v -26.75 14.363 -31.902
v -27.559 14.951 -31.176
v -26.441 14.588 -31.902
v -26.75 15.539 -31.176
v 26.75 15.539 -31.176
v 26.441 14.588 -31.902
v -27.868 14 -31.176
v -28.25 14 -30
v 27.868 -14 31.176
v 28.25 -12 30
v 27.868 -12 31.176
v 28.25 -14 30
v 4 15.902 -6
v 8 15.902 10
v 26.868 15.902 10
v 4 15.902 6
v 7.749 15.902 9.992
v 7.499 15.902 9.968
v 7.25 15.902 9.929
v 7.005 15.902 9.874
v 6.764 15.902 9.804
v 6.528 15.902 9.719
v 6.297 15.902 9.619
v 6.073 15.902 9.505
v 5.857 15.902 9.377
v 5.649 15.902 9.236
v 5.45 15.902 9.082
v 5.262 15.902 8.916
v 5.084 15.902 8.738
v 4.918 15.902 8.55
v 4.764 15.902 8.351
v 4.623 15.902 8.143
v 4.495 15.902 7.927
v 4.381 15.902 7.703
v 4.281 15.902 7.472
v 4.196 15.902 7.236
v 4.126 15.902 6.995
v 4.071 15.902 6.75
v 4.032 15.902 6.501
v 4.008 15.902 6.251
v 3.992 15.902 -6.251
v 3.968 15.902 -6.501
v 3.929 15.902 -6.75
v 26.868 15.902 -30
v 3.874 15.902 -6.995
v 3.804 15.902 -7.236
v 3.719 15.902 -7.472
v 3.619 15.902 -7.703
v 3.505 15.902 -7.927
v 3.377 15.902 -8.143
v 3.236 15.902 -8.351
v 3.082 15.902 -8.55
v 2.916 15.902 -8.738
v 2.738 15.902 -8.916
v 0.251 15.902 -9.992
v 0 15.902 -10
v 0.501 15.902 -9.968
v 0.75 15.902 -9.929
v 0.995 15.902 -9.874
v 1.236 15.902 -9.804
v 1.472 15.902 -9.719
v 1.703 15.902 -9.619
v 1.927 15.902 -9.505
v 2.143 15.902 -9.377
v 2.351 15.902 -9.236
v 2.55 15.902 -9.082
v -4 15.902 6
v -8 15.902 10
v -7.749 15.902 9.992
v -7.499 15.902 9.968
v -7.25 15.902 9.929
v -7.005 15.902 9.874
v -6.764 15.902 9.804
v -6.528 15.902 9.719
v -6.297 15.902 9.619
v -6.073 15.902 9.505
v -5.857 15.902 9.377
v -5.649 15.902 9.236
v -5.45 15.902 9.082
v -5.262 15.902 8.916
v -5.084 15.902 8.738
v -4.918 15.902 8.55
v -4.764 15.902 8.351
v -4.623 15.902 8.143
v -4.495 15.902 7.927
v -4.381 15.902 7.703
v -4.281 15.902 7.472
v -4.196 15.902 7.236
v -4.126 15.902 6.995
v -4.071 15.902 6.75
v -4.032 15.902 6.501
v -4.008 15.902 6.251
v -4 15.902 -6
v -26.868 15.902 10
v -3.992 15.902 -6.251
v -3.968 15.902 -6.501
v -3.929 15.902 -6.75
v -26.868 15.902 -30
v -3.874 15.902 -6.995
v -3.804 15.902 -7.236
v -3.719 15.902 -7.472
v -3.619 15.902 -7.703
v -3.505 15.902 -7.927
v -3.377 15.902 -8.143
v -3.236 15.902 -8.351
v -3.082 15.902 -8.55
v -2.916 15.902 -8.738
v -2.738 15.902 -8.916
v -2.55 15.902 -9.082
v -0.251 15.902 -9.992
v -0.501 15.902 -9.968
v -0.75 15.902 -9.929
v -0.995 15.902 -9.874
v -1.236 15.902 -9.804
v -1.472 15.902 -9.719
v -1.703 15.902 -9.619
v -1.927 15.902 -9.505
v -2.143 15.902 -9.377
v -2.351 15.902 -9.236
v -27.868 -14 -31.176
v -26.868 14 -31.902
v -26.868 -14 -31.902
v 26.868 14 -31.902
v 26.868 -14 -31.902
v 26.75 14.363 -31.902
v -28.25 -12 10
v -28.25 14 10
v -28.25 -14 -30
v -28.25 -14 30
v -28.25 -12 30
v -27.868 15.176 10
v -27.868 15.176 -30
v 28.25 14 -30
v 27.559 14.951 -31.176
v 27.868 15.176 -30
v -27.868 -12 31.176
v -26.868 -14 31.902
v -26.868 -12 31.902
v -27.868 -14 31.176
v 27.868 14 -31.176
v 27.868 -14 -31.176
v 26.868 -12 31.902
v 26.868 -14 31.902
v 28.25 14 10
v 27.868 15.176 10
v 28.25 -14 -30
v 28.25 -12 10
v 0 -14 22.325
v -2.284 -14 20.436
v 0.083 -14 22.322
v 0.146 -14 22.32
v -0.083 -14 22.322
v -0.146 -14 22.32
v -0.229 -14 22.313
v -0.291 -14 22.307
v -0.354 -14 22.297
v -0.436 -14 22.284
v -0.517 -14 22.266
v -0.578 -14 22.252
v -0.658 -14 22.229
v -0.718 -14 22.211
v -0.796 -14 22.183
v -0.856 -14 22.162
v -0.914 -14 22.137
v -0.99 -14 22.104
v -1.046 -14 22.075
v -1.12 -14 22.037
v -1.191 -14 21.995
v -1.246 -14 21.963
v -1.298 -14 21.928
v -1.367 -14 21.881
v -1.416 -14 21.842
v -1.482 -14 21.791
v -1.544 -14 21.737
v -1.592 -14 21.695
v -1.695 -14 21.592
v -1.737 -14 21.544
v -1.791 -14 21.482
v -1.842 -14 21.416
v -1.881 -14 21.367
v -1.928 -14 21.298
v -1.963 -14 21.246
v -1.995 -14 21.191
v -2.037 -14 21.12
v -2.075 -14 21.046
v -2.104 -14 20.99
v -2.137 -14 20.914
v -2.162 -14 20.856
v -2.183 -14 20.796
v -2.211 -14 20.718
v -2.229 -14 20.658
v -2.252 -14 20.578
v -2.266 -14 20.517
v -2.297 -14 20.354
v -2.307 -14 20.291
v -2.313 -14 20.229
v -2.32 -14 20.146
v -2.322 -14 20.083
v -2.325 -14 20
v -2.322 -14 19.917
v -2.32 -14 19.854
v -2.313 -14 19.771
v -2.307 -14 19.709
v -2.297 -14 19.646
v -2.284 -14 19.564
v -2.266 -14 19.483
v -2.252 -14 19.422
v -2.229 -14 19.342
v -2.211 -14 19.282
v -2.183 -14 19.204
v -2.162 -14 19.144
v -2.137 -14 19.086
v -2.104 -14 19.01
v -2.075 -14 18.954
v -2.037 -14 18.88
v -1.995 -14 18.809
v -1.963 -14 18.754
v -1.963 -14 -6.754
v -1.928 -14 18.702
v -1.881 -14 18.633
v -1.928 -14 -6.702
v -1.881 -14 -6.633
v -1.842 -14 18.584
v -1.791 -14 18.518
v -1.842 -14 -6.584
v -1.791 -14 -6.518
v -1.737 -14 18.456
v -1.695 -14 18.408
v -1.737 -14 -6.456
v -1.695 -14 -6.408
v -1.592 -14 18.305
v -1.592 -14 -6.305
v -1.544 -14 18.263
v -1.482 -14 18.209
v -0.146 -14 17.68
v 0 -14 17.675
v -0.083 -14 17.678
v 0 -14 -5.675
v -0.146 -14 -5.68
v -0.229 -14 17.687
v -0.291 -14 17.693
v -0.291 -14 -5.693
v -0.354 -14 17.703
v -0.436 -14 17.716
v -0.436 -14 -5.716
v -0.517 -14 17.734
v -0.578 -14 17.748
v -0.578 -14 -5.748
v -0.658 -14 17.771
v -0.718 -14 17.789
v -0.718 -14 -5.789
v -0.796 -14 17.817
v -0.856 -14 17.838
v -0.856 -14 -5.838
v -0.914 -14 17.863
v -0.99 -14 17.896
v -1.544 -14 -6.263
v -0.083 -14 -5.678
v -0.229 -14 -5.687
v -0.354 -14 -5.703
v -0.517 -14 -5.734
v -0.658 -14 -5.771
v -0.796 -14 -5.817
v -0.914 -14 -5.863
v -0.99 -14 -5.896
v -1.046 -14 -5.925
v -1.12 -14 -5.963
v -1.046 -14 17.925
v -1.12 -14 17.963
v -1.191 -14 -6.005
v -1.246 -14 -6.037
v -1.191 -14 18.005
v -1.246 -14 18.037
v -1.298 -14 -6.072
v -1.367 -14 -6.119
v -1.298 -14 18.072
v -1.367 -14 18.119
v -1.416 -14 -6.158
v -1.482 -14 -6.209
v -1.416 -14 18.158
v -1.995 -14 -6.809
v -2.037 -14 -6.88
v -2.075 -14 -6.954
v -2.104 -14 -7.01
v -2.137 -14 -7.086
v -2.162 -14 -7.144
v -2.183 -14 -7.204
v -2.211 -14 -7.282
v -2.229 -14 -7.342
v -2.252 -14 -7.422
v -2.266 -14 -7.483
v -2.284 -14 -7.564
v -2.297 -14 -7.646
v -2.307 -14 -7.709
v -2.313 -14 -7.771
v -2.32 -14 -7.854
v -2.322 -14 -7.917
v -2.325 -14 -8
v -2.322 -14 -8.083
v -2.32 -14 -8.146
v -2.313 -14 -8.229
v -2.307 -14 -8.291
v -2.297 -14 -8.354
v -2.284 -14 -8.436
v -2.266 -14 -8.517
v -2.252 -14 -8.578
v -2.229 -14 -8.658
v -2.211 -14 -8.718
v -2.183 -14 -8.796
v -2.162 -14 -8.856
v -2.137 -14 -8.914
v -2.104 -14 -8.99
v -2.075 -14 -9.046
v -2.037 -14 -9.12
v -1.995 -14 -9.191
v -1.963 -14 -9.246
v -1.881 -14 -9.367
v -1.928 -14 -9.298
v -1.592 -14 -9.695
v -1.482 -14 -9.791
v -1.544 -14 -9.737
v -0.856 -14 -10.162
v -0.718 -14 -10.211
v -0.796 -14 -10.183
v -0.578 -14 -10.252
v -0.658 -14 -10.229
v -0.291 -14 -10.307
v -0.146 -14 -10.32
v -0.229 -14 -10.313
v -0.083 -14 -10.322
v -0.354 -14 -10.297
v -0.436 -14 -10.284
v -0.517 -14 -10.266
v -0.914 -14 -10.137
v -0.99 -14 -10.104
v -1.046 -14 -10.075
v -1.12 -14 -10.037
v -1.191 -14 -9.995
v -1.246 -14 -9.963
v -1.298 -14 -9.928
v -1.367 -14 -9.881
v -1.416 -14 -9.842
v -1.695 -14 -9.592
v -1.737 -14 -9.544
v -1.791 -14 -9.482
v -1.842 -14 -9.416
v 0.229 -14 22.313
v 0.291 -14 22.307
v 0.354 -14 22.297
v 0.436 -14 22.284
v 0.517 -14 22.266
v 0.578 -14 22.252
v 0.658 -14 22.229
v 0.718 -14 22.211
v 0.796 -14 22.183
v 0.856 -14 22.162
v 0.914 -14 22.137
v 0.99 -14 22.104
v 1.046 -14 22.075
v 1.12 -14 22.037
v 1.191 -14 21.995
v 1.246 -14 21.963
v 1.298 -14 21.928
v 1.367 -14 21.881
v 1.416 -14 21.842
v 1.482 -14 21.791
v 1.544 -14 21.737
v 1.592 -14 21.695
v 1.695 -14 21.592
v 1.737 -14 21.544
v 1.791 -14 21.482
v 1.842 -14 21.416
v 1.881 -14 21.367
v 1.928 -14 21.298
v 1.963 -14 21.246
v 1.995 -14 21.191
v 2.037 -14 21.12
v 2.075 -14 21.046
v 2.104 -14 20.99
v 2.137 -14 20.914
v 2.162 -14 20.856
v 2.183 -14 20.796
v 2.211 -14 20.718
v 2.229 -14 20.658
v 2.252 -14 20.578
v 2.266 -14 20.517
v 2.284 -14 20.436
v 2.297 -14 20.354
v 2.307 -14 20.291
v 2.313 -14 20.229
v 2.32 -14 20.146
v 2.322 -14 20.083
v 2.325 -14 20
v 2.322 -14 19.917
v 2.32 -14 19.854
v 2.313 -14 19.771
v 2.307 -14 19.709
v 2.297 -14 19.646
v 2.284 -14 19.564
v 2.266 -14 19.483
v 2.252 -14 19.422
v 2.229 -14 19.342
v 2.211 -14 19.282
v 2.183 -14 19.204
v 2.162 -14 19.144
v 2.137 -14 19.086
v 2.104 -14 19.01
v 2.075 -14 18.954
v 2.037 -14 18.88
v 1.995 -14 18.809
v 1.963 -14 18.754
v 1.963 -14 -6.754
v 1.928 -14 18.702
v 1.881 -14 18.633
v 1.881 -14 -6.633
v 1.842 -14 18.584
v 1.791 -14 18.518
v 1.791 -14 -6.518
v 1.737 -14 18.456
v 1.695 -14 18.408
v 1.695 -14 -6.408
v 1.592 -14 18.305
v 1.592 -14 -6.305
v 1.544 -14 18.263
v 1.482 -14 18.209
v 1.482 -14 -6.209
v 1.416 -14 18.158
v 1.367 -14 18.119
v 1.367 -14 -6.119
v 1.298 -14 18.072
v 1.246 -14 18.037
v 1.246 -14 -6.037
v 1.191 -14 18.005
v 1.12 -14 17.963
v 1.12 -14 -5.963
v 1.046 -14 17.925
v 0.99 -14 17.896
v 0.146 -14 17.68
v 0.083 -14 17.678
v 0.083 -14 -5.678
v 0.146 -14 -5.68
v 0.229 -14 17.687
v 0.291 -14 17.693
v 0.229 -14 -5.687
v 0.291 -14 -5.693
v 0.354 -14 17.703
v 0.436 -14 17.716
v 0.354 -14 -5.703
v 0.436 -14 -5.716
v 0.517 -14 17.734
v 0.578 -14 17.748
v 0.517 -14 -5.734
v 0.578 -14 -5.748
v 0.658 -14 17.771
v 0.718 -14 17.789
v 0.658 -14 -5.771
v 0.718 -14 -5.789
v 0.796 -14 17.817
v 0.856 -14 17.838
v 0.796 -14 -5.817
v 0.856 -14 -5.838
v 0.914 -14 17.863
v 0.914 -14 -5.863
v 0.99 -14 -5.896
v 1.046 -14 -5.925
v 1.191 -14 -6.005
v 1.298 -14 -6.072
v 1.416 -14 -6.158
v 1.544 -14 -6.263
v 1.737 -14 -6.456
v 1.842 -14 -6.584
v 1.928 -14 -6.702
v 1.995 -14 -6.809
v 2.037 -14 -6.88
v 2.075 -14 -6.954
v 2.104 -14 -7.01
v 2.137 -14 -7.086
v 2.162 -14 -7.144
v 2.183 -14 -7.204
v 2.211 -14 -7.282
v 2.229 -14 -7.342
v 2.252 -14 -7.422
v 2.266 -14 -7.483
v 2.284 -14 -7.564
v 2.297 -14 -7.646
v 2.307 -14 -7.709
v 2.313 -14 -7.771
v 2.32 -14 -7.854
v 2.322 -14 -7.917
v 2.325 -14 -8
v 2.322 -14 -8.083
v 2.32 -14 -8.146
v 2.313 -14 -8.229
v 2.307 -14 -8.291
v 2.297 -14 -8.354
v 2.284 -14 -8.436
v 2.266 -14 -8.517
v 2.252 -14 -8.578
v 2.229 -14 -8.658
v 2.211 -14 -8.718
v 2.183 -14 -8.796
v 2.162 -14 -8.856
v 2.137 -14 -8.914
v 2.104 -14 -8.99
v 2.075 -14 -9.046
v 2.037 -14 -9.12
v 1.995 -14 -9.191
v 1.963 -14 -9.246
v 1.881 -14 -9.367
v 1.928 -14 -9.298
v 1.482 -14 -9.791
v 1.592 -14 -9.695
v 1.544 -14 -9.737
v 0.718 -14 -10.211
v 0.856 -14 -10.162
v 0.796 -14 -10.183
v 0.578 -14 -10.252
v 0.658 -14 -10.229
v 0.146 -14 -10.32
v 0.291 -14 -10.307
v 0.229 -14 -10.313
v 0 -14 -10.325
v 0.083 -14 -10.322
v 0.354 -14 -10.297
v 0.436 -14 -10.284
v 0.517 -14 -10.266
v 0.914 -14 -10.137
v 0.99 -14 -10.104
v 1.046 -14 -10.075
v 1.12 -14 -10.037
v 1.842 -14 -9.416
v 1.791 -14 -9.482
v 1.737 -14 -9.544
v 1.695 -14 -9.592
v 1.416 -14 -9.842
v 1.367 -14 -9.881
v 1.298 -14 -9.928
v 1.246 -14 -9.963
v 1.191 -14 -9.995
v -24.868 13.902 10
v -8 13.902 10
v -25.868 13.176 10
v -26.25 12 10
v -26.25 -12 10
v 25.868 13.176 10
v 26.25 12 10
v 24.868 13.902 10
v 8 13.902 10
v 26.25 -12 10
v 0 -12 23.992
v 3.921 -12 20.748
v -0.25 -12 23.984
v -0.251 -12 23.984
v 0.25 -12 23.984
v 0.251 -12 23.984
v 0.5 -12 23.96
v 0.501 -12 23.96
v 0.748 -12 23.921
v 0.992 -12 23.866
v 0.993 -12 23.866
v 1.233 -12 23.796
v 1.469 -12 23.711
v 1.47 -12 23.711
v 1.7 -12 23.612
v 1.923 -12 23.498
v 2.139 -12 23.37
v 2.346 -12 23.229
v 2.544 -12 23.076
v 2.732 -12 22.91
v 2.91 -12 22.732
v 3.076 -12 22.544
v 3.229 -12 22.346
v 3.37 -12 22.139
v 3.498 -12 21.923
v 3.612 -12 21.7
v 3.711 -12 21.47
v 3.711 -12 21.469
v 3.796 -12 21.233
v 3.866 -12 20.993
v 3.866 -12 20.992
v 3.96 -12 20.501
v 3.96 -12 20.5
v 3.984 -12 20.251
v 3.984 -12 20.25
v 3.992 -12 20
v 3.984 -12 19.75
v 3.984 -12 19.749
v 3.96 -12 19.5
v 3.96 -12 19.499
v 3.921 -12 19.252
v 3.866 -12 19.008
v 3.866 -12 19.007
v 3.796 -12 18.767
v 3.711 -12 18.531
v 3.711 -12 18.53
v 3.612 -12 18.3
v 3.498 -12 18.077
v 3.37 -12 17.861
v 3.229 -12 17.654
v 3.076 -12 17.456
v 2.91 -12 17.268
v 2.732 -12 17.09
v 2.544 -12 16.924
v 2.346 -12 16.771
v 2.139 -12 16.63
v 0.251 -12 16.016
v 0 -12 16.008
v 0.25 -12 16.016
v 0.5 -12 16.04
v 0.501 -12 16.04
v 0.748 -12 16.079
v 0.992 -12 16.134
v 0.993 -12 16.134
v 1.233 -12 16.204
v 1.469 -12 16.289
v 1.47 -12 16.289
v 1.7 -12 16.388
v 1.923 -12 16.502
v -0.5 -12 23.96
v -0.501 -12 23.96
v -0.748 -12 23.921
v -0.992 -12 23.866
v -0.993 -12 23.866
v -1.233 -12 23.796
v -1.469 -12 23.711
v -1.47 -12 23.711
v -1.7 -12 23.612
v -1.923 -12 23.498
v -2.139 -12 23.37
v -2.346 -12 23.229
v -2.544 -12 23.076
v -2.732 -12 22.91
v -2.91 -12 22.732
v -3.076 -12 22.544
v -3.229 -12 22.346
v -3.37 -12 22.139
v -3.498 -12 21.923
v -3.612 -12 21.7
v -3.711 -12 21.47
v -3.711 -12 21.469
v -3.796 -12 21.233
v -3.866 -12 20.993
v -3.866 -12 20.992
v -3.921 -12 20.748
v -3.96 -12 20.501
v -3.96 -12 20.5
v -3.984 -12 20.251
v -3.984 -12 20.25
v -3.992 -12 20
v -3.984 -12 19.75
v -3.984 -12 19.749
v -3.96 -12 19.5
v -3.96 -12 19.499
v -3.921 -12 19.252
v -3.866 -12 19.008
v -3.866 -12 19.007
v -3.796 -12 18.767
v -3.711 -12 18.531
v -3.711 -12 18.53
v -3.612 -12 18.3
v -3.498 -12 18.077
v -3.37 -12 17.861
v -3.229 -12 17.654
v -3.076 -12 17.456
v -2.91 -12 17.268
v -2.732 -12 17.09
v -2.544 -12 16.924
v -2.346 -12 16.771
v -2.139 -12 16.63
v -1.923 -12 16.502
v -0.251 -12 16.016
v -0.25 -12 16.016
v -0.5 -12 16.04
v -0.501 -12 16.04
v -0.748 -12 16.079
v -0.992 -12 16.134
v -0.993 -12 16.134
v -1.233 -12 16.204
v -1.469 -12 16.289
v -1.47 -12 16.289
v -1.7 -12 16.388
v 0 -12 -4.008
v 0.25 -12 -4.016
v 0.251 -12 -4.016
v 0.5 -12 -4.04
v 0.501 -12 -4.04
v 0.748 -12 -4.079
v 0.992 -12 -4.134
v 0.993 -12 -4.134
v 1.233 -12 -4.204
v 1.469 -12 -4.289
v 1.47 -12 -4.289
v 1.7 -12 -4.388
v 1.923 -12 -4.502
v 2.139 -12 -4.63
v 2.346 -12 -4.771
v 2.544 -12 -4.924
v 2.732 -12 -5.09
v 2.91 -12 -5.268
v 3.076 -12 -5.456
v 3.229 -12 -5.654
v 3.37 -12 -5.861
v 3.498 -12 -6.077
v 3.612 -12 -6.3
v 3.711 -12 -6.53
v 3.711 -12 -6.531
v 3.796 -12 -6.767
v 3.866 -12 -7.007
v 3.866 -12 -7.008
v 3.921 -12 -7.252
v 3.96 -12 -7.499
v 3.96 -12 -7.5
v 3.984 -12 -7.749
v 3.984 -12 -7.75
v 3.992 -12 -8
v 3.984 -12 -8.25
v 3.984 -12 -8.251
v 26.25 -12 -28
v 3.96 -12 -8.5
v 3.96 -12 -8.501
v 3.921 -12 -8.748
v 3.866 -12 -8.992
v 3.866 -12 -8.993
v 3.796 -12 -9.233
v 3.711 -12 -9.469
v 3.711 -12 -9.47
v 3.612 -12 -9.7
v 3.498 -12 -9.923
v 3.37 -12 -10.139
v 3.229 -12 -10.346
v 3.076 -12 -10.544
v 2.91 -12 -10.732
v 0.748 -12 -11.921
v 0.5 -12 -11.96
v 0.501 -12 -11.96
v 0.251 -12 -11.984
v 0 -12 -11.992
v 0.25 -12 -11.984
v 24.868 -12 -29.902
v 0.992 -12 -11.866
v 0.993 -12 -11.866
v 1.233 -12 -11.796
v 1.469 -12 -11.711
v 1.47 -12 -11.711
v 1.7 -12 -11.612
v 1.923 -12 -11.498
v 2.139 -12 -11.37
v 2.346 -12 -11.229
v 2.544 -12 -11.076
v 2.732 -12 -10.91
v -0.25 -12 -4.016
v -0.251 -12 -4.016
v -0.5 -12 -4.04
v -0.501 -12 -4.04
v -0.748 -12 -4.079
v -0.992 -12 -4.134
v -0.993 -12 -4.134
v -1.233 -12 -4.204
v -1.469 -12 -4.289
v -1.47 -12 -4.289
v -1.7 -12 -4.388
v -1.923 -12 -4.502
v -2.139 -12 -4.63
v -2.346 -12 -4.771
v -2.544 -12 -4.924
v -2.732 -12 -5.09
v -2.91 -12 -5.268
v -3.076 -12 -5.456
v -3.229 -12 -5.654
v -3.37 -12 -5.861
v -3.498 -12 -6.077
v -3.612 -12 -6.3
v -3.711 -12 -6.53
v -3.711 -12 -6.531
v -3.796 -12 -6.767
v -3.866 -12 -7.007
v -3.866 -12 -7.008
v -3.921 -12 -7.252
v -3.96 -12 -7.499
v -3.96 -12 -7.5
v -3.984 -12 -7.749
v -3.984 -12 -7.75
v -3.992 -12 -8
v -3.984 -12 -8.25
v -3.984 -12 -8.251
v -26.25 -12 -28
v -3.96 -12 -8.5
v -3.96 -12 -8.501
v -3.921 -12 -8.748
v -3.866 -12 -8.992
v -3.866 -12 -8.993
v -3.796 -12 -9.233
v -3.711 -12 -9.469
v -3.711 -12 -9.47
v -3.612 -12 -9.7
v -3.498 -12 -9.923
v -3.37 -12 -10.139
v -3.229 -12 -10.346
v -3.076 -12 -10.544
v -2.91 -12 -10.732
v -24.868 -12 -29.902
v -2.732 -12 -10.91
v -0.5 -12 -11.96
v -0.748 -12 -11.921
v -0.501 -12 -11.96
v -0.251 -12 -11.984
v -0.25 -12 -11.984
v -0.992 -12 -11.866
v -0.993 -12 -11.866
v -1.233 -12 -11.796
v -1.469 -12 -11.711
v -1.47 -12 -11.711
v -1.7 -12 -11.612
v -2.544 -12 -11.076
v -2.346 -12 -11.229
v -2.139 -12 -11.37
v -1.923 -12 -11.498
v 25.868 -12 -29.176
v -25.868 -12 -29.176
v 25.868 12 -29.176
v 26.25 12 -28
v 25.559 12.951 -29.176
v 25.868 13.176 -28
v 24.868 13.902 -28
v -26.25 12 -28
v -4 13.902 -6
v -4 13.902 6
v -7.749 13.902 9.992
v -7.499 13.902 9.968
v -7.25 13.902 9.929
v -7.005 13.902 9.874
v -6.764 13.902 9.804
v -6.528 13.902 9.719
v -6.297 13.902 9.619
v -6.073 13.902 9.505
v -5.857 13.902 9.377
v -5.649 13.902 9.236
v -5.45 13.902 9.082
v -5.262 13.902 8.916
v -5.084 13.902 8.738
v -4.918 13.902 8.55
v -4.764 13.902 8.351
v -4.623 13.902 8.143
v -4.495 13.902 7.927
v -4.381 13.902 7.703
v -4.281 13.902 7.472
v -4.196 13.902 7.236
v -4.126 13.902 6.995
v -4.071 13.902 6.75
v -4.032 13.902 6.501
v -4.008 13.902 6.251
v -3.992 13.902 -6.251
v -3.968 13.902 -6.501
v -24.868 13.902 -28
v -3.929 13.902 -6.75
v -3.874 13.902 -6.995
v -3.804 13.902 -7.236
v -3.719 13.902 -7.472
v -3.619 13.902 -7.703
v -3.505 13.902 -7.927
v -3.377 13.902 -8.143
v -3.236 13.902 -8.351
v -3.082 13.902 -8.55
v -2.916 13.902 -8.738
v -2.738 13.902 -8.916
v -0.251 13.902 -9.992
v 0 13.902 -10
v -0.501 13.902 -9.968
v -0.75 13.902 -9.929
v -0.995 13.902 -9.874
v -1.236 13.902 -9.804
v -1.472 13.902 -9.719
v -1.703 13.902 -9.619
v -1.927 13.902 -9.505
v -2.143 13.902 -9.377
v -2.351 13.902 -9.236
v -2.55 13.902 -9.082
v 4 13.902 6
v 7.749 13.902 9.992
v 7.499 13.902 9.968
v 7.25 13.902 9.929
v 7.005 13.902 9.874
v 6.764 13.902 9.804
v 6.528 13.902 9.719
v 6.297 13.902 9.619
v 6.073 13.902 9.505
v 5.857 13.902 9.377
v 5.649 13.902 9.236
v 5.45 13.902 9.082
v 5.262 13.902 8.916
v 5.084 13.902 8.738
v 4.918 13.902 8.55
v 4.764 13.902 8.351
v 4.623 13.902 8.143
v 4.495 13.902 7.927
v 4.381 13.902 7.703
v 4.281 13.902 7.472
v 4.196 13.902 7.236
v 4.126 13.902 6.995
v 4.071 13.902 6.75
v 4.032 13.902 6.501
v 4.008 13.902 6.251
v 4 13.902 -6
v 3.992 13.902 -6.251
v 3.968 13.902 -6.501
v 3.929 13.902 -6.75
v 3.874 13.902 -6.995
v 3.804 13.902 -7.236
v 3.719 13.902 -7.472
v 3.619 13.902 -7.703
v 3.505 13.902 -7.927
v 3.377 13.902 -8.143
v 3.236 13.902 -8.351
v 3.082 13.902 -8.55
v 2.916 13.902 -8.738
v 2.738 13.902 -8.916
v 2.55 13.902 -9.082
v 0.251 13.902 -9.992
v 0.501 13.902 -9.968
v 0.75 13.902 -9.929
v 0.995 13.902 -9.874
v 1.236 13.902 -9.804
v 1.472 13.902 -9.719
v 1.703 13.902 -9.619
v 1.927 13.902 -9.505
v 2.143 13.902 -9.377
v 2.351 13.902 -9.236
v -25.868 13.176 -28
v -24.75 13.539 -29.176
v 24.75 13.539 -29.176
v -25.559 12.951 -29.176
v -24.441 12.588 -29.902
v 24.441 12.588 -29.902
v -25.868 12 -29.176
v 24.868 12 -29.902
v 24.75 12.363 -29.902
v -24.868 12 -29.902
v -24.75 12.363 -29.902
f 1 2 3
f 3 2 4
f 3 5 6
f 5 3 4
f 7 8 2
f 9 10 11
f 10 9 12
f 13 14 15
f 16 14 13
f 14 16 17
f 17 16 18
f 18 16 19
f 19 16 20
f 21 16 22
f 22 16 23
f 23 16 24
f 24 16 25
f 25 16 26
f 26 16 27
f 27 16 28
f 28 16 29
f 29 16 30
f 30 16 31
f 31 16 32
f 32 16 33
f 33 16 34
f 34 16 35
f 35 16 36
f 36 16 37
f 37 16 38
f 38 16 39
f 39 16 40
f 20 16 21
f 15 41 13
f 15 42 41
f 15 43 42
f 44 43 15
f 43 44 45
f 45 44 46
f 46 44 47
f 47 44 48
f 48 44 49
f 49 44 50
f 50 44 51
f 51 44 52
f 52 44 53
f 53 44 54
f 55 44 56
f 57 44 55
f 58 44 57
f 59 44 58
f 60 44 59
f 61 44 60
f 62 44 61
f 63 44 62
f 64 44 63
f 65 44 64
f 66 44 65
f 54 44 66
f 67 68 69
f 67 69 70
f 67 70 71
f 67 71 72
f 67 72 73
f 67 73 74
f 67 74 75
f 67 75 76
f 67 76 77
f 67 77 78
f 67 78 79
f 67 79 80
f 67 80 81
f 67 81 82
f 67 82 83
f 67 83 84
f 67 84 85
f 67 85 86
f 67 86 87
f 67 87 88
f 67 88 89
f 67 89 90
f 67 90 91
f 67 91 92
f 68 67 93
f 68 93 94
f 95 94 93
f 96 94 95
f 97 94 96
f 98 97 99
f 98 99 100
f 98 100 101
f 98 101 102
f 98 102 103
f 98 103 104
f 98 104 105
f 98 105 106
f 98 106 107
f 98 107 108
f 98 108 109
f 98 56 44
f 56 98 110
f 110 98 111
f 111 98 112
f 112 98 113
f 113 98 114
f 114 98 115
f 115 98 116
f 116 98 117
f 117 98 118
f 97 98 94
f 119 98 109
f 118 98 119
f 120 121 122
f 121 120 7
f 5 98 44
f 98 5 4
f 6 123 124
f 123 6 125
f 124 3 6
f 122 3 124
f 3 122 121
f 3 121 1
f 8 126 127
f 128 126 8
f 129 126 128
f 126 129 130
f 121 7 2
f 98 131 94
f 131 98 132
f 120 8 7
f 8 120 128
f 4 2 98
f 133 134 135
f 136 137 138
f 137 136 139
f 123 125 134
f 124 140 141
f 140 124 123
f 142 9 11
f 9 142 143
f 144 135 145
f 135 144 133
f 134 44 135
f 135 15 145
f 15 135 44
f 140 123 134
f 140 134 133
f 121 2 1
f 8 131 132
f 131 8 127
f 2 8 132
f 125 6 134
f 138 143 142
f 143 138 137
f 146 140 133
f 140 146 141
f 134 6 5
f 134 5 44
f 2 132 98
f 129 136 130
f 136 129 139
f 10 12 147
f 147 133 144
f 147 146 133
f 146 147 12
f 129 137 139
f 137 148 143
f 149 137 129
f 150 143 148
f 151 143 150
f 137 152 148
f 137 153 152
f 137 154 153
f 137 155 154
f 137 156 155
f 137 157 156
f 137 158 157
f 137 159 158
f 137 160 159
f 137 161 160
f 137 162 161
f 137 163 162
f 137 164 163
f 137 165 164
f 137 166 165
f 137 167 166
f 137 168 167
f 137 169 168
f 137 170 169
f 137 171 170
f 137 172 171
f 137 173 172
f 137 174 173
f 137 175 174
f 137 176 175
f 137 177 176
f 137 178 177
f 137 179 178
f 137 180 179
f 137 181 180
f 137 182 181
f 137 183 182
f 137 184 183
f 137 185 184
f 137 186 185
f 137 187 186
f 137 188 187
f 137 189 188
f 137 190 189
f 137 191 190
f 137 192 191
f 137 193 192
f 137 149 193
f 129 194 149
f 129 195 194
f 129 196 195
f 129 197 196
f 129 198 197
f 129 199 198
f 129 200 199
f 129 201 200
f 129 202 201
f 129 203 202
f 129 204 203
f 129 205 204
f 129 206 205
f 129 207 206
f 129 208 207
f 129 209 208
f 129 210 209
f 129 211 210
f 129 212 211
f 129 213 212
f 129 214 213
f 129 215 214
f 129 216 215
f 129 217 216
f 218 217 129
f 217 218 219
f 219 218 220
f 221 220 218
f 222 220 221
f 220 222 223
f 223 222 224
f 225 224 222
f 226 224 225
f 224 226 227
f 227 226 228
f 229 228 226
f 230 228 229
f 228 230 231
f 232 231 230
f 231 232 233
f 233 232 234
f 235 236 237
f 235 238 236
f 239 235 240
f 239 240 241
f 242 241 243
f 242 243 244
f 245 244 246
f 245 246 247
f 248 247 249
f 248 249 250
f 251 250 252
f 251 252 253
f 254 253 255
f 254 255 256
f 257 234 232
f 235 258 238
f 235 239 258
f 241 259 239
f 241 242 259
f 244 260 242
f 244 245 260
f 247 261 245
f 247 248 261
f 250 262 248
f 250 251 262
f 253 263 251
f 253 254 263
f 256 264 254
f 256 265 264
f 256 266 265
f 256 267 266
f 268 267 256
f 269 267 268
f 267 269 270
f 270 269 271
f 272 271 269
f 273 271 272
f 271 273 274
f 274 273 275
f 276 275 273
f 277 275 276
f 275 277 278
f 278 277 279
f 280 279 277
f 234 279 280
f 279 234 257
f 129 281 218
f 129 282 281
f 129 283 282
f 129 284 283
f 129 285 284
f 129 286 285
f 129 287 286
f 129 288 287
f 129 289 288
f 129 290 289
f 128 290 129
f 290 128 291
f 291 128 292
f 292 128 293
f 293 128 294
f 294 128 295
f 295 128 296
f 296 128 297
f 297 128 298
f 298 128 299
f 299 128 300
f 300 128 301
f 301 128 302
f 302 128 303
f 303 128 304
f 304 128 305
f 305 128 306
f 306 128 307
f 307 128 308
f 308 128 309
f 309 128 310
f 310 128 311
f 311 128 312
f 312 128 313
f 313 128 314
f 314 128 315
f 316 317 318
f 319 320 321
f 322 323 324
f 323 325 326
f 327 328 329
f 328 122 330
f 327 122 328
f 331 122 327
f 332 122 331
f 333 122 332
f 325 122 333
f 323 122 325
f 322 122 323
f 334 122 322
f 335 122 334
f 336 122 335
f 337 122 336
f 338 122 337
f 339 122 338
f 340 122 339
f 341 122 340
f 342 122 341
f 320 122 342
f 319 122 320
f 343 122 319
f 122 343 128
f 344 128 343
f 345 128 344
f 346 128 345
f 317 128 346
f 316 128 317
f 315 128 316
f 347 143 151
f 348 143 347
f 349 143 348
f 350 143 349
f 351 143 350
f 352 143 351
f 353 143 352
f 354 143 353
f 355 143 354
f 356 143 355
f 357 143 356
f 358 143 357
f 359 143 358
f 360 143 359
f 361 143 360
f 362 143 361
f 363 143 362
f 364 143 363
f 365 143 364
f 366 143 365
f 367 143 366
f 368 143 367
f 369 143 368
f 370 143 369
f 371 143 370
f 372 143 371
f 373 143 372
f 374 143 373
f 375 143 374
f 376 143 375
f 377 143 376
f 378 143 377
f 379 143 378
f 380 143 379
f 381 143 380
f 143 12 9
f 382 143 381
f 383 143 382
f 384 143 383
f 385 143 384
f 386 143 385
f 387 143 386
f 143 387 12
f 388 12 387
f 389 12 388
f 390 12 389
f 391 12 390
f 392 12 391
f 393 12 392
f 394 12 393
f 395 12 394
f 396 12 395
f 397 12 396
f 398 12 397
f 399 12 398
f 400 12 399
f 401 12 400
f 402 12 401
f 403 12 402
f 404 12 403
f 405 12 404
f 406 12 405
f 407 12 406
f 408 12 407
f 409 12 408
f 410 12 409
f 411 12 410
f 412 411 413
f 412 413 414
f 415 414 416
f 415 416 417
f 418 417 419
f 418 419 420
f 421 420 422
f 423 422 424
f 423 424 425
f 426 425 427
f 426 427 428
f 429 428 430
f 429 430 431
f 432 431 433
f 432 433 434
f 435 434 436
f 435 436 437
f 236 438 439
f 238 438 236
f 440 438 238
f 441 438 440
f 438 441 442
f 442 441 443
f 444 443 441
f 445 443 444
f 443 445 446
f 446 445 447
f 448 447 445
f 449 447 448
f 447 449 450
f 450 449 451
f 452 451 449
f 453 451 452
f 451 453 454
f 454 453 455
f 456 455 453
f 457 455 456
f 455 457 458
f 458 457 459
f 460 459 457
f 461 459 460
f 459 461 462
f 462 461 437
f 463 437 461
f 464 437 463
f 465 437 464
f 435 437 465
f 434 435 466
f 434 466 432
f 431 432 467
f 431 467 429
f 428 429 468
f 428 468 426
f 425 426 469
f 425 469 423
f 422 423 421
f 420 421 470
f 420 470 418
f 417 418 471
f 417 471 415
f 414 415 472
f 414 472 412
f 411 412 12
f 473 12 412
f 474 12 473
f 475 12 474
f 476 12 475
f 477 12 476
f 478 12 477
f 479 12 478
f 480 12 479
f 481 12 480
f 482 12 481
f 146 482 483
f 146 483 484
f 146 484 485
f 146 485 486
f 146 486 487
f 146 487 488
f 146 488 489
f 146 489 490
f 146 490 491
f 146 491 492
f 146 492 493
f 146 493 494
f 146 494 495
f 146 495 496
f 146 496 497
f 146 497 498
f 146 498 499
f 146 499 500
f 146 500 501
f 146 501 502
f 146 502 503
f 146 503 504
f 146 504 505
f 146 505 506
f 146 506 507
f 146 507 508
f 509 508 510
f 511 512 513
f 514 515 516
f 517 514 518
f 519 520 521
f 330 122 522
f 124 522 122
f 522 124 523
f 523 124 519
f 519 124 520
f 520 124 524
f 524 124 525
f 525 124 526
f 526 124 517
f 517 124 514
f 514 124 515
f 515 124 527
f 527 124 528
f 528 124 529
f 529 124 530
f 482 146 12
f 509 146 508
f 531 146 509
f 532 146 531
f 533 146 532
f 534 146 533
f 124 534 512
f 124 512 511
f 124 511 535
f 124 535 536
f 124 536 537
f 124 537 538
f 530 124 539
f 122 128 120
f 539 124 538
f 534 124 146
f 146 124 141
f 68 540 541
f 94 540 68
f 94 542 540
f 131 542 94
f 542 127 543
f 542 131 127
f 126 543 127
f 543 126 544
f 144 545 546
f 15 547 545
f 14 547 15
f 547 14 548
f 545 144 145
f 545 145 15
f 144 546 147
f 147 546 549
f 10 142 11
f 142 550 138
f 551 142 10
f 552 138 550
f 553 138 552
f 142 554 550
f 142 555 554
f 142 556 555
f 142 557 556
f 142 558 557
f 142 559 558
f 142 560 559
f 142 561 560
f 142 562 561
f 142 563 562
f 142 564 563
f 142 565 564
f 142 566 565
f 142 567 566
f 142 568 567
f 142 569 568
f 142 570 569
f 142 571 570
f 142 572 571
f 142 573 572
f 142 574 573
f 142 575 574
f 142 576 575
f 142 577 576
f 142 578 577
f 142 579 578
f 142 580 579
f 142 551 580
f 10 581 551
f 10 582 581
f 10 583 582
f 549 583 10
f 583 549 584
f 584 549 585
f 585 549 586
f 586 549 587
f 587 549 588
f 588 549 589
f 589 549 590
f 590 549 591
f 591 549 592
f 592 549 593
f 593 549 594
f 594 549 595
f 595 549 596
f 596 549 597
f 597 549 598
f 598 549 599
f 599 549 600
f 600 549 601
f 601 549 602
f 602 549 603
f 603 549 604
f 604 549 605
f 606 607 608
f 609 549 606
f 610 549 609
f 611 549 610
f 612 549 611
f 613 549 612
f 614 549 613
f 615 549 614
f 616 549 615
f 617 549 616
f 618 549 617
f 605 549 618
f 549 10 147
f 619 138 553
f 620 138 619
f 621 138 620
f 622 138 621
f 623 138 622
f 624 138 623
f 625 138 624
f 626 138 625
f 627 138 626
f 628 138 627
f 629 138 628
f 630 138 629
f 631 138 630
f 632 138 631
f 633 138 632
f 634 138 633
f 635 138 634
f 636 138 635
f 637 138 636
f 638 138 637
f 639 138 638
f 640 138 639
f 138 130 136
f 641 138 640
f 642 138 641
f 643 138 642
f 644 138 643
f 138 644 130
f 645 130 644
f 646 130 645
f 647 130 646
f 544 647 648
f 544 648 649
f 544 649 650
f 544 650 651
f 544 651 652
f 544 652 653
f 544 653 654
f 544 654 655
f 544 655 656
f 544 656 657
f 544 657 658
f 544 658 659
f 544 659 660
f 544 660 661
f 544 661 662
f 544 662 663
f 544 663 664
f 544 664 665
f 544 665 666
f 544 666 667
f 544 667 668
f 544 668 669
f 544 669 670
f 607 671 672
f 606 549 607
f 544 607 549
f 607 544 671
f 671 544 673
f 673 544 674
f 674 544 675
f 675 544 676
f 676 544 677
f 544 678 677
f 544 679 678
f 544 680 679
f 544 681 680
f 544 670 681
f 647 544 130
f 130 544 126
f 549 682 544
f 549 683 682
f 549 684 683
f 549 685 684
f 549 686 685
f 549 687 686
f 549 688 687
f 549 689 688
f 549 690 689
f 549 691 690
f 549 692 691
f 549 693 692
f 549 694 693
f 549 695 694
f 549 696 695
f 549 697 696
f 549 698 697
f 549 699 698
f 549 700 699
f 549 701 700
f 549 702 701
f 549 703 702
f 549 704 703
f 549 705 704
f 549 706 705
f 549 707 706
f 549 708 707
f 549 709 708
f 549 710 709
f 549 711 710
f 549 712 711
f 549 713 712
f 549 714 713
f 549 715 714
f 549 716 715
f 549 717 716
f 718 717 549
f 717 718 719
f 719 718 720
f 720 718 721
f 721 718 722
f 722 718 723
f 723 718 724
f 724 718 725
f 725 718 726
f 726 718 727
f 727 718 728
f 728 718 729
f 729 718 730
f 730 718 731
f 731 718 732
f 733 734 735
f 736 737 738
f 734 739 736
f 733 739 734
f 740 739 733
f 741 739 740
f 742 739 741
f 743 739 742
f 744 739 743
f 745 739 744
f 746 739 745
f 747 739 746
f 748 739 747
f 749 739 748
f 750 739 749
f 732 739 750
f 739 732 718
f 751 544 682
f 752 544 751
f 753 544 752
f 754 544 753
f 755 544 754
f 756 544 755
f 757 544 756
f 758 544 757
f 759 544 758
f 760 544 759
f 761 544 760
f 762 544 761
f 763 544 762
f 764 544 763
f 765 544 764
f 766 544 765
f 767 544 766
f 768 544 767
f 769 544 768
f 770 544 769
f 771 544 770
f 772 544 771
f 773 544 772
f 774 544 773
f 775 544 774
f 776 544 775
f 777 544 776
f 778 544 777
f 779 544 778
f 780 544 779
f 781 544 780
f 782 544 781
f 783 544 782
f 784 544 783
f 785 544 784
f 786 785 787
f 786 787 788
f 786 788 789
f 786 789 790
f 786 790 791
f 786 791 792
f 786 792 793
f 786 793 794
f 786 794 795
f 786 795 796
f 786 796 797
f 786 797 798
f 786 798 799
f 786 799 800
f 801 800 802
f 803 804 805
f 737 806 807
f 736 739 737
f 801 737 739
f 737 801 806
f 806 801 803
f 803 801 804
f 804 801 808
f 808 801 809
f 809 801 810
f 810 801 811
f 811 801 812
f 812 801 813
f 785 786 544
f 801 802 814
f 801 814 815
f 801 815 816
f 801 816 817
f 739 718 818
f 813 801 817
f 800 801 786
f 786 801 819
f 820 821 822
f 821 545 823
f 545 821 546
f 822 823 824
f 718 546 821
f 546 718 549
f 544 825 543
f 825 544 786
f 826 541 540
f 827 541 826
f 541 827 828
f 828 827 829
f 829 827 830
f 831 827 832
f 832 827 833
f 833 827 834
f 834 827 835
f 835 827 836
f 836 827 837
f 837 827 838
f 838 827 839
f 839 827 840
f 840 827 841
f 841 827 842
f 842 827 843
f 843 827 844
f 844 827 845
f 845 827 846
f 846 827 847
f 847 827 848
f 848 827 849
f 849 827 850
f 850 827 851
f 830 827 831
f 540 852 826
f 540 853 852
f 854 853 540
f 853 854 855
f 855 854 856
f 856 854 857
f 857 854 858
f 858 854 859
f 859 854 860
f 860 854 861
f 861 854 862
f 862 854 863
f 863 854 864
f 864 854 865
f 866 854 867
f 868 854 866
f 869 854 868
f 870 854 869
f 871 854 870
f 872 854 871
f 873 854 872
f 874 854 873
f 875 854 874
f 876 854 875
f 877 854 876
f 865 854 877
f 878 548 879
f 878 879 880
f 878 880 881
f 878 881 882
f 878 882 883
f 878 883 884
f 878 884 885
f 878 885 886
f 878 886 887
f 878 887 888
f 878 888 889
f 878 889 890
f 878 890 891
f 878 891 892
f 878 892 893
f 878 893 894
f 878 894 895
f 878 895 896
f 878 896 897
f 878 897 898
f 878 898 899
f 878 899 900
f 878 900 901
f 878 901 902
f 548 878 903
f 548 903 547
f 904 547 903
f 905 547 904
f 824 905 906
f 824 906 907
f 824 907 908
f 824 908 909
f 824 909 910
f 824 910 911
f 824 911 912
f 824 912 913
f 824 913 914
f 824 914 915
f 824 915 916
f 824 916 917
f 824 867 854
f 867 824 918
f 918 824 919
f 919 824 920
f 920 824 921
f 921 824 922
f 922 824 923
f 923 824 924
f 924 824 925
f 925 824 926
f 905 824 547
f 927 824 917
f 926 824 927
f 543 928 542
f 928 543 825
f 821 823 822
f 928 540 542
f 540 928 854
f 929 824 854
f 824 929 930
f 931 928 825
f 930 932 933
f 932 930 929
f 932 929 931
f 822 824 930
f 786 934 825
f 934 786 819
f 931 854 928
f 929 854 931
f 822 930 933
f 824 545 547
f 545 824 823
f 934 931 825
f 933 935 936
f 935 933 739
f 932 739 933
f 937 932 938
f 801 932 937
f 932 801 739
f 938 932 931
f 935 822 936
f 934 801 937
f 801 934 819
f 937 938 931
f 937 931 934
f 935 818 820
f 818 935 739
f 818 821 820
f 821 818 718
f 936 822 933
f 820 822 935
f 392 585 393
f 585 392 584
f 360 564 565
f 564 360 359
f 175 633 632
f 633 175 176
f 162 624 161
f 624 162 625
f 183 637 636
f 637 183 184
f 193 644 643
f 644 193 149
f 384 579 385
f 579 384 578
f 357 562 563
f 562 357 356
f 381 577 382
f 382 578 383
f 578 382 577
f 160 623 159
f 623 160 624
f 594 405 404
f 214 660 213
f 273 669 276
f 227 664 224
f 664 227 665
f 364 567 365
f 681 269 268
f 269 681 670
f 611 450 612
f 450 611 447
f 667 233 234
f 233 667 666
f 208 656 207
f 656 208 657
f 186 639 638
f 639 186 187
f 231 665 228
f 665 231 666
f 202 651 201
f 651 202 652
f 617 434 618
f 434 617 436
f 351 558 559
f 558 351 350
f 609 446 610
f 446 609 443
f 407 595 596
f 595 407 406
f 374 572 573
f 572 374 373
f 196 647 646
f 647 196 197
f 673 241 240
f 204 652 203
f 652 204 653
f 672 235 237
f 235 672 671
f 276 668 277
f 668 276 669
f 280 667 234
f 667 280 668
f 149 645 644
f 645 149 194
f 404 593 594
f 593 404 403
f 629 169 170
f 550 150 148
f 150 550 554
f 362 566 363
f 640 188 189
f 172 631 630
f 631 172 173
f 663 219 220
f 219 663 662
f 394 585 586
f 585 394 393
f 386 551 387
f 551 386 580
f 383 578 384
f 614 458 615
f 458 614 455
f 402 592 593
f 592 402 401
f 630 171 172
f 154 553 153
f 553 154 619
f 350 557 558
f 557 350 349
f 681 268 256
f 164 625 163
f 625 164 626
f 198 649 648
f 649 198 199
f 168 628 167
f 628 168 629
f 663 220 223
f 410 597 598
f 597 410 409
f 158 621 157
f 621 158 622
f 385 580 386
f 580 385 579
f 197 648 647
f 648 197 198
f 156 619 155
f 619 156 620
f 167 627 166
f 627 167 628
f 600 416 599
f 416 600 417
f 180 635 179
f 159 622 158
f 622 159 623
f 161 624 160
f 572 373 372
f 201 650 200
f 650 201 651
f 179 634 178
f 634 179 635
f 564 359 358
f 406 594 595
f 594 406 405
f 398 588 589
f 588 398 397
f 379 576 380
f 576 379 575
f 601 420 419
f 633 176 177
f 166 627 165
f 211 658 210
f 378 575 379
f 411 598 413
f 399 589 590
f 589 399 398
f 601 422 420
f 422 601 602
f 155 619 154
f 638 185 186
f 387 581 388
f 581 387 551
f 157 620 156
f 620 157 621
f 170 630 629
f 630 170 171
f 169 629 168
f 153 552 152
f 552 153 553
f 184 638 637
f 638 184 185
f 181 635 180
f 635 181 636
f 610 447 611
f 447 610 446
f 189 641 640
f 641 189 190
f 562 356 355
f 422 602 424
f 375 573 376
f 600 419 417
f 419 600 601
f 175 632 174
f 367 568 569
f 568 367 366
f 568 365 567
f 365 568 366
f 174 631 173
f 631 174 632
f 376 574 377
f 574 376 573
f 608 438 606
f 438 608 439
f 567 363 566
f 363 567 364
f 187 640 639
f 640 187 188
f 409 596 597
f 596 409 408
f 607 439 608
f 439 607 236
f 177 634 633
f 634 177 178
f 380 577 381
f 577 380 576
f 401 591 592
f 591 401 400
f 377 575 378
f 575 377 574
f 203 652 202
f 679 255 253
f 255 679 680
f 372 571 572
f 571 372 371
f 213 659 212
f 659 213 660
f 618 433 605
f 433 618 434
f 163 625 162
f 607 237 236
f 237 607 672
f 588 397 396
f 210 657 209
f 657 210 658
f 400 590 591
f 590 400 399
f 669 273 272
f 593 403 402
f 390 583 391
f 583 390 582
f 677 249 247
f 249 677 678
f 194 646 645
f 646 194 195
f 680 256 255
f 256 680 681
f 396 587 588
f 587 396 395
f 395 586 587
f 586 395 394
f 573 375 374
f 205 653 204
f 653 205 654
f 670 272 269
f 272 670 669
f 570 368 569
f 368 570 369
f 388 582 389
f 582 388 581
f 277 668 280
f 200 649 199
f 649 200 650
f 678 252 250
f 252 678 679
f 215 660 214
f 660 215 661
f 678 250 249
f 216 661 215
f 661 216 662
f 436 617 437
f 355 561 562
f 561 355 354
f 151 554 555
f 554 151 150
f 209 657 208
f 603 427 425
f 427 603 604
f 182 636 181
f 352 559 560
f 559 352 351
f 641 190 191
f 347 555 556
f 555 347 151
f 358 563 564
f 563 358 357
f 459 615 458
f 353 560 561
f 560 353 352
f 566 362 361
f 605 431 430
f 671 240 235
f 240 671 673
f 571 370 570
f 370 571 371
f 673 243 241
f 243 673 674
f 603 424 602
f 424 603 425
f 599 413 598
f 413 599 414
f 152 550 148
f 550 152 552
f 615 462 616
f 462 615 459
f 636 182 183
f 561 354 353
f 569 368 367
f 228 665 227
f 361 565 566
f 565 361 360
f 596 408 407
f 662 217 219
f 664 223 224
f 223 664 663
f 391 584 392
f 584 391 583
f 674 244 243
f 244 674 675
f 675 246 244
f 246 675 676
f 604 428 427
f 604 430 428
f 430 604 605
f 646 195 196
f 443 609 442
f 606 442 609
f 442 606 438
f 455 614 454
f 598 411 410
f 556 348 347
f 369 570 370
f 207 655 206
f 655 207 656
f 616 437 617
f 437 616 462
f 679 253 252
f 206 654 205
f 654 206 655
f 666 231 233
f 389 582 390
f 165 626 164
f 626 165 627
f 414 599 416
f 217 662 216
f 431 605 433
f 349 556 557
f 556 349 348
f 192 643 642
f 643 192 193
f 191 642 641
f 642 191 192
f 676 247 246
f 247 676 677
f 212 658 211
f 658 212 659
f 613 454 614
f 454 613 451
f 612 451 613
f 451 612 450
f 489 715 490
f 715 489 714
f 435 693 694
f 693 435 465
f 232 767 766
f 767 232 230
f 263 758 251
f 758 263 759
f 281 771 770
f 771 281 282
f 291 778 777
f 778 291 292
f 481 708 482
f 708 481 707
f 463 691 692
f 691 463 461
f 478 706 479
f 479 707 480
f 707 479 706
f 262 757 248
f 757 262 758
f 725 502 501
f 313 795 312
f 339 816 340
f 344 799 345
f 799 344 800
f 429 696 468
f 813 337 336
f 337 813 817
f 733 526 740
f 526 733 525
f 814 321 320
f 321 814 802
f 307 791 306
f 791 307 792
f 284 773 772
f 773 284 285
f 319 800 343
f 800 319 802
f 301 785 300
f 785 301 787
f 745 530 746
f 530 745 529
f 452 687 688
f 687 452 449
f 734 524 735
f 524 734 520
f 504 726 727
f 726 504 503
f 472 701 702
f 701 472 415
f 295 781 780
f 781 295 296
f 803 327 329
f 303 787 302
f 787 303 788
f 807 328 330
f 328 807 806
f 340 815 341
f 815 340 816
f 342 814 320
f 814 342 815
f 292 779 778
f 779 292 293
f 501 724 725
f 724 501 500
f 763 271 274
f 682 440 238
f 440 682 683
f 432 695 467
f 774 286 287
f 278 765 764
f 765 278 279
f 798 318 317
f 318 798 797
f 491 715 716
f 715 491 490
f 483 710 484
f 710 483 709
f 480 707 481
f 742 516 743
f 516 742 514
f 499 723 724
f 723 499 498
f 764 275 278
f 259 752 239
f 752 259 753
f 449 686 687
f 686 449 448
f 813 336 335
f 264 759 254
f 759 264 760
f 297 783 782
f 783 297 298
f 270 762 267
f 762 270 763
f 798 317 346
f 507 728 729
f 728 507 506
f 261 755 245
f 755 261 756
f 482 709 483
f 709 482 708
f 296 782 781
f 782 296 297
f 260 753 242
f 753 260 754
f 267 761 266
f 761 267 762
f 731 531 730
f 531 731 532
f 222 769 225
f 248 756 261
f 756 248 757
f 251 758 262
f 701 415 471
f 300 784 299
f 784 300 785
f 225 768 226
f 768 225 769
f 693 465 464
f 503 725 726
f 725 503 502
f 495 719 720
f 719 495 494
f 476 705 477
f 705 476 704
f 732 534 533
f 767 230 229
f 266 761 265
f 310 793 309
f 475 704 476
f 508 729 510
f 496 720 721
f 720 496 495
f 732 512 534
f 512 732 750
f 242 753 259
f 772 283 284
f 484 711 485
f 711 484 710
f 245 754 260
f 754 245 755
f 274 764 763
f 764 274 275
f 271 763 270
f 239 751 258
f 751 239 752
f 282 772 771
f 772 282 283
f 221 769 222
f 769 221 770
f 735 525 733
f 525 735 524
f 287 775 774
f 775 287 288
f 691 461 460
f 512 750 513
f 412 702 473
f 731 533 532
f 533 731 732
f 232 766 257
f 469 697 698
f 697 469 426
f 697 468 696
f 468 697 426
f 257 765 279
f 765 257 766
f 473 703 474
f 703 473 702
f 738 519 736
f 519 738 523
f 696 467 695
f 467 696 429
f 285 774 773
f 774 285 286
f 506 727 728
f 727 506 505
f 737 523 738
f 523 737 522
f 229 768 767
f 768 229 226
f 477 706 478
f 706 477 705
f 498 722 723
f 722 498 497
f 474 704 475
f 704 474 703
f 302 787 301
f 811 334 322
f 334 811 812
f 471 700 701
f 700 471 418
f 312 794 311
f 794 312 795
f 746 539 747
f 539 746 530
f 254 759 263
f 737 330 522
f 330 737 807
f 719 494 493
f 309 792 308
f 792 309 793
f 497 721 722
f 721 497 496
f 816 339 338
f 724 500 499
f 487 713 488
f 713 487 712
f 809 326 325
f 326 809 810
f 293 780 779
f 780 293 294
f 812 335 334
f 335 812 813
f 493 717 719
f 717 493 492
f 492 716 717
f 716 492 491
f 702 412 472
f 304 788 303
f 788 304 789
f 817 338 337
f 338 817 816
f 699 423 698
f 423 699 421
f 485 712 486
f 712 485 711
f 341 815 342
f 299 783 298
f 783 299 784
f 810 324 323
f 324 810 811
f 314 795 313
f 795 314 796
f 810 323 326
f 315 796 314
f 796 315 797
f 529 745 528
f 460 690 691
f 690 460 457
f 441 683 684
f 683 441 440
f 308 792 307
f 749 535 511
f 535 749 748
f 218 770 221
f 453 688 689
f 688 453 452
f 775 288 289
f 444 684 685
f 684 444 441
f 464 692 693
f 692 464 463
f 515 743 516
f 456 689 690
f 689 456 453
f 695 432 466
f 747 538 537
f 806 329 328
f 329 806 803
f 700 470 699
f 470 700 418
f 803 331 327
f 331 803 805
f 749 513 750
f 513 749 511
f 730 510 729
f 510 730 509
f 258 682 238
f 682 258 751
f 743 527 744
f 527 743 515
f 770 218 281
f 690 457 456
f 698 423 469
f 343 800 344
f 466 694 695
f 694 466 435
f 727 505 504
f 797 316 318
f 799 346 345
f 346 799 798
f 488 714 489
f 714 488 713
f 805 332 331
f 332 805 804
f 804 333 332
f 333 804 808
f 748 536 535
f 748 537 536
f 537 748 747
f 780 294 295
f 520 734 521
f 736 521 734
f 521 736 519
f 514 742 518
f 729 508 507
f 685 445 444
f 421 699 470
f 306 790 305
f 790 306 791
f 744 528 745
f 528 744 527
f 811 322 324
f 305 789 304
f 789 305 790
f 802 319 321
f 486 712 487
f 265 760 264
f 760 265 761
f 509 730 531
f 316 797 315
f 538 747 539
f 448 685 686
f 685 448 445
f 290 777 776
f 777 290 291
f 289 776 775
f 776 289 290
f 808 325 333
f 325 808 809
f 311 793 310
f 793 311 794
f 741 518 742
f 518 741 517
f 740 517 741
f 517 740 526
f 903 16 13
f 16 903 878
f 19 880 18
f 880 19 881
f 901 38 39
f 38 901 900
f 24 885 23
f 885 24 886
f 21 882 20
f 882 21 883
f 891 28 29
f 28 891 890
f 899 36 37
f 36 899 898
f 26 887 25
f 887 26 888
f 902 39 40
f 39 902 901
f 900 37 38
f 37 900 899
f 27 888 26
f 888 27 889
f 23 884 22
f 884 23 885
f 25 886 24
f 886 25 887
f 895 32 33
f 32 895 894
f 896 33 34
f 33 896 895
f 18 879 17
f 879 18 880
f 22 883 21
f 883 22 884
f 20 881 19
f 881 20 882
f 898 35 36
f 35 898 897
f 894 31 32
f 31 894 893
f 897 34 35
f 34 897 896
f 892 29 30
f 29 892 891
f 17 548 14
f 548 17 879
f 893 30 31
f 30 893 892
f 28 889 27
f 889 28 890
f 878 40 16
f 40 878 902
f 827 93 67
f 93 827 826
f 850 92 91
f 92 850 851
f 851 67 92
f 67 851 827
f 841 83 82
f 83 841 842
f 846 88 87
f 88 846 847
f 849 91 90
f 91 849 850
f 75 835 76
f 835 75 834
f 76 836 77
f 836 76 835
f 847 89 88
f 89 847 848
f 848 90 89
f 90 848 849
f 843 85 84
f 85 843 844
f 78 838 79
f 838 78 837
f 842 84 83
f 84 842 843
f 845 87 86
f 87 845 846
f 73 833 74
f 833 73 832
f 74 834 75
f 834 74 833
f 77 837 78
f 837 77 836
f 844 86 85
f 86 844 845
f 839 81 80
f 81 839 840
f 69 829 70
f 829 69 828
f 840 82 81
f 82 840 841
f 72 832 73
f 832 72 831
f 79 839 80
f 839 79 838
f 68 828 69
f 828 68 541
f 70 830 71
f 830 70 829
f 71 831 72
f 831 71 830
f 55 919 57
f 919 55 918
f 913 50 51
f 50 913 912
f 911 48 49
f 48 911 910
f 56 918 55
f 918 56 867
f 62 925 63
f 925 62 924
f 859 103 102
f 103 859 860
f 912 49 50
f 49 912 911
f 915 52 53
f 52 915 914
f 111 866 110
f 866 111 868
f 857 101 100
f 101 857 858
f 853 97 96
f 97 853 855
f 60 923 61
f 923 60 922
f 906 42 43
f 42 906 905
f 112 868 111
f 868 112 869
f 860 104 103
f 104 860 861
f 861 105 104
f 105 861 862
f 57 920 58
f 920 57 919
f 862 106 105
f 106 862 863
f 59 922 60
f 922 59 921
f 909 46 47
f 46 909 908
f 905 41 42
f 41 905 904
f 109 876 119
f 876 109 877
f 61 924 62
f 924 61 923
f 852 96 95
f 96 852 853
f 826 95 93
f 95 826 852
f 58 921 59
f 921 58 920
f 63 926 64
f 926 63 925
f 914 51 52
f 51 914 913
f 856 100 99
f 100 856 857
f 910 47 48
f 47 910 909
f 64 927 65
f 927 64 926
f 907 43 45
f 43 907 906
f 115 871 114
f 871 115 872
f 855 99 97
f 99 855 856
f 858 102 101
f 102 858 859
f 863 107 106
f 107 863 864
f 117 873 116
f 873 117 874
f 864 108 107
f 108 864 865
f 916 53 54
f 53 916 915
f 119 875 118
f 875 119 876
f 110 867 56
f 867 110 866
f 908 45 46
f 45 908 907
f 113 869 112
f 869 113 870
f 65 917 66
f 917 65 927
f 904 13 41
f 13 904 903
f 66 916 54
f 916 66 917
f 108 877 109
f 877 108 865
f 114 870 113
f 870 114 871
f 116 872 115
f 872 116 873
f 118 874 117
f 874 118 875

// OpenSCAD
largeur_telecommande_tv = 48.5;
epaisseur_telecommande_tv = 24;
largeur_telecommande_freebox = 38.8;
epaisseur_telecommande_freebox = 17.5;
largeur_telecommande_ampli = 50;
epaisseur_telecommande_ampli = 18.8;
hauteur_support = 40;
hauteur_totale_support = 60;
epaisseur_support = 2;
detail = 10;
epaisseur_minkowski = 2;
grand_rayon_vis = 4;
petit_rayon_vis = 1.5;

module cube_rounded(longueur, largeur, hauteur){
	minkowski (){
		cube([longueur, largeur, hauteur], center = true);
		sphere (epaisseur_minkowski, $fn=detail);
	}
}

module vis(){
	cylinder (r1=petit_rayon_vis, r2=petit_rayon_vis, h=10, $fn=100);
	cylinder (r1=grand_rayon_vis, r2=petit_rayon_vis, h=3, $fn=100);
}

module ovale(hauteur, largeur){
	cube([largeur, 2*epaisseur_support, hauteur-largeur], center=true);
	translate([0,epaisseur_support,(hauteur-largeur)/2]) rotate([90,0,0]) cylinder(r=largeur/2, h=2*epaisseur_support, $fn=100);
	translate([0,epaisseur_support,-(hauteur-largeur)/2]) rotate([90,0,0]) cylinder(r=largeur/2, h=2*epaisseur_support, $fn=100);
}

module rainure(hauteur, largeur){
	difference() {
		cube([2*largeur, 2*epaisseur_support-0.1, hauteur-largeur], center = true);
		translate([largeur, 0, -largeur/2]) ovale(hauteur, largeur);
		translate([-largeur, 0, -largeur/2]) ovale(hauteur, largeur);
	}
	translate([0, 0, -largeur/2]) ovale(hauteur, largeur);
}

module step1(largeur_telecommande, epaisseur_telecommande){
	supp = 2*epaisseur_support;
	em = epaisseur_minkowski;
	difference(){
		cube_rounded(largeur_telecommande+supp, epaisseur_telecommande+supp, hauteur_totale_support);
		translate([0,-(em/2+epaisseur_telecommande/2+epaisseur_support),0]) 
			cube([largeur_telecommande+supp+2*em, em, hauteur_totale_support+supp], center = true);
		translate([0,(epaisseur_support+em)/2,hauteur_support]) 
			cube([largeur_telecommande+supp+2*em+1, epaisseur_telecommande+em+epaisseur_support, hauteur_totale_support], center = true);
	}
}

module step2(largeur_telecommande, epaisseur_telecommande){
	em = epaisseur_minkowski;
	difference(){
		step1(largeur_telecommande, epaisseur_telecommande);
		translate([0,0,epaisseur_support])
		difference(){
			cube_rounded(largeur_telecommande, epaisseur_telecommande, hauteur_totale_support);
			translate([0,-(epaisseur_telecommande+em)/2,0])
			cube([largeur_telecommande+2*em, em, hauteur_totale_support+2*em], center = true);
		}
	}
	
}

module step3(largeur_telecommande, epaisseur_telecommande){
	hauteur_rainure = grand_rayon_vis-hauteur_support/4+(hauteur_totale_support/2-(hauteur_totale_support-hauteur_support));
	hauteur_vis_1 = hauteur_totale_support/2 - (hauteur_totale_support-hauteur_support)/2;
	hauteur_vis_2 = hauteur_rainure+2*grand_rayon_vis-hauteur_support/2;
	difference(){
		step2(largeur_telecommande, epaisseur_telecommande);
		translate([0,-epaisseur_telecommande/2+0.01, hauteur_vis_1]) rotate([90,0,0]) color("red") vis();
		translate([0,-epaisseur_telecommande/2+0.01, hauteur_vis_2]) rotate([90,0,0]) color("red") vis();
		translate([0,epaisseur_telecommande/2+epaisseur_support,hauteur_rainure]) rainure(hauteur_support/2, 2*grand_rayon_vis);
	}
}

module telecommande_freebox(){
	largeur_telecommande = largeur_telecommande_freebox;
	epaisseur_telecommande = epaisseur_telecommande_freebox;
	step3(largeur_telecommande, epaisseur_telecommande);
}

module telecommande_ampli(){
	largeur_telecommande = largeur_telecommande_ampli;
	epaisseur_telecommande = epaisseur_telecommande_ampli;
	step3(largeur_telecommande, epaisseur_telecommande);
}

module telecommande_tv(){
	largeur_telecommande = largeur_telecommande_tv;
	epaisseur_telecommande = epaisseur_telecommande_tv;
	step3(largeur_telecommande, epaisseur_telecommande);
}

module telecommande_groupees(){
	position_x_freebox = 0;
	position_y_freebox = epaisseur_telecommande_freebox/2;
	position_x_ampli = largeur_telecommande_freebox/2+largeur_telecommande_ampli/2+epaisseur_support+2*epaisseur_minkowski;
	position_y_ampli = epaisseur_telecommande_ampli/2;
	position_x_tv = position_x_ampli+largeur_telecommande_ampli/2+largeur_telecommande_tv/2+epaisseur_support+2*epaisseur_minkowski;
	position_y_tv = epaisseur_telecommande_tv/2;
	longueur_totale = largeur_telecommande_freebox+largeur_telecommande_ampli+largeur_telecommande_tv+6*epaisseur_minkowski+4*epaisseur_support;
	difference(){
		union(){
			translate([position_x_freebox,position_y_freebox,0]) color("red") telecommande_freebox();
			translate([position_x_ampli,position_y_ampli,0]) color("green") telecommande_ampli();
			translate([position_x_tv,position_y_tv,0]) color("blue") telecommande_tv();
		}
		translate([-(largeur_telecommande_freebox/2+epaisseur_support+epaisseur_minkowski),-epaisseur_support,hauteur_totale_support/2-(hauteur_totale_support-hauteur_support)]) cube([longueur_totale+1, 2*epaisseur_support, hauteur_totale_support-hauteur_support+epaisseur_minkowski]);
	}

}

//telecommande_groupees();
//telecommande_freebox();
//telecommande_ampli();
telecommande_tv();
